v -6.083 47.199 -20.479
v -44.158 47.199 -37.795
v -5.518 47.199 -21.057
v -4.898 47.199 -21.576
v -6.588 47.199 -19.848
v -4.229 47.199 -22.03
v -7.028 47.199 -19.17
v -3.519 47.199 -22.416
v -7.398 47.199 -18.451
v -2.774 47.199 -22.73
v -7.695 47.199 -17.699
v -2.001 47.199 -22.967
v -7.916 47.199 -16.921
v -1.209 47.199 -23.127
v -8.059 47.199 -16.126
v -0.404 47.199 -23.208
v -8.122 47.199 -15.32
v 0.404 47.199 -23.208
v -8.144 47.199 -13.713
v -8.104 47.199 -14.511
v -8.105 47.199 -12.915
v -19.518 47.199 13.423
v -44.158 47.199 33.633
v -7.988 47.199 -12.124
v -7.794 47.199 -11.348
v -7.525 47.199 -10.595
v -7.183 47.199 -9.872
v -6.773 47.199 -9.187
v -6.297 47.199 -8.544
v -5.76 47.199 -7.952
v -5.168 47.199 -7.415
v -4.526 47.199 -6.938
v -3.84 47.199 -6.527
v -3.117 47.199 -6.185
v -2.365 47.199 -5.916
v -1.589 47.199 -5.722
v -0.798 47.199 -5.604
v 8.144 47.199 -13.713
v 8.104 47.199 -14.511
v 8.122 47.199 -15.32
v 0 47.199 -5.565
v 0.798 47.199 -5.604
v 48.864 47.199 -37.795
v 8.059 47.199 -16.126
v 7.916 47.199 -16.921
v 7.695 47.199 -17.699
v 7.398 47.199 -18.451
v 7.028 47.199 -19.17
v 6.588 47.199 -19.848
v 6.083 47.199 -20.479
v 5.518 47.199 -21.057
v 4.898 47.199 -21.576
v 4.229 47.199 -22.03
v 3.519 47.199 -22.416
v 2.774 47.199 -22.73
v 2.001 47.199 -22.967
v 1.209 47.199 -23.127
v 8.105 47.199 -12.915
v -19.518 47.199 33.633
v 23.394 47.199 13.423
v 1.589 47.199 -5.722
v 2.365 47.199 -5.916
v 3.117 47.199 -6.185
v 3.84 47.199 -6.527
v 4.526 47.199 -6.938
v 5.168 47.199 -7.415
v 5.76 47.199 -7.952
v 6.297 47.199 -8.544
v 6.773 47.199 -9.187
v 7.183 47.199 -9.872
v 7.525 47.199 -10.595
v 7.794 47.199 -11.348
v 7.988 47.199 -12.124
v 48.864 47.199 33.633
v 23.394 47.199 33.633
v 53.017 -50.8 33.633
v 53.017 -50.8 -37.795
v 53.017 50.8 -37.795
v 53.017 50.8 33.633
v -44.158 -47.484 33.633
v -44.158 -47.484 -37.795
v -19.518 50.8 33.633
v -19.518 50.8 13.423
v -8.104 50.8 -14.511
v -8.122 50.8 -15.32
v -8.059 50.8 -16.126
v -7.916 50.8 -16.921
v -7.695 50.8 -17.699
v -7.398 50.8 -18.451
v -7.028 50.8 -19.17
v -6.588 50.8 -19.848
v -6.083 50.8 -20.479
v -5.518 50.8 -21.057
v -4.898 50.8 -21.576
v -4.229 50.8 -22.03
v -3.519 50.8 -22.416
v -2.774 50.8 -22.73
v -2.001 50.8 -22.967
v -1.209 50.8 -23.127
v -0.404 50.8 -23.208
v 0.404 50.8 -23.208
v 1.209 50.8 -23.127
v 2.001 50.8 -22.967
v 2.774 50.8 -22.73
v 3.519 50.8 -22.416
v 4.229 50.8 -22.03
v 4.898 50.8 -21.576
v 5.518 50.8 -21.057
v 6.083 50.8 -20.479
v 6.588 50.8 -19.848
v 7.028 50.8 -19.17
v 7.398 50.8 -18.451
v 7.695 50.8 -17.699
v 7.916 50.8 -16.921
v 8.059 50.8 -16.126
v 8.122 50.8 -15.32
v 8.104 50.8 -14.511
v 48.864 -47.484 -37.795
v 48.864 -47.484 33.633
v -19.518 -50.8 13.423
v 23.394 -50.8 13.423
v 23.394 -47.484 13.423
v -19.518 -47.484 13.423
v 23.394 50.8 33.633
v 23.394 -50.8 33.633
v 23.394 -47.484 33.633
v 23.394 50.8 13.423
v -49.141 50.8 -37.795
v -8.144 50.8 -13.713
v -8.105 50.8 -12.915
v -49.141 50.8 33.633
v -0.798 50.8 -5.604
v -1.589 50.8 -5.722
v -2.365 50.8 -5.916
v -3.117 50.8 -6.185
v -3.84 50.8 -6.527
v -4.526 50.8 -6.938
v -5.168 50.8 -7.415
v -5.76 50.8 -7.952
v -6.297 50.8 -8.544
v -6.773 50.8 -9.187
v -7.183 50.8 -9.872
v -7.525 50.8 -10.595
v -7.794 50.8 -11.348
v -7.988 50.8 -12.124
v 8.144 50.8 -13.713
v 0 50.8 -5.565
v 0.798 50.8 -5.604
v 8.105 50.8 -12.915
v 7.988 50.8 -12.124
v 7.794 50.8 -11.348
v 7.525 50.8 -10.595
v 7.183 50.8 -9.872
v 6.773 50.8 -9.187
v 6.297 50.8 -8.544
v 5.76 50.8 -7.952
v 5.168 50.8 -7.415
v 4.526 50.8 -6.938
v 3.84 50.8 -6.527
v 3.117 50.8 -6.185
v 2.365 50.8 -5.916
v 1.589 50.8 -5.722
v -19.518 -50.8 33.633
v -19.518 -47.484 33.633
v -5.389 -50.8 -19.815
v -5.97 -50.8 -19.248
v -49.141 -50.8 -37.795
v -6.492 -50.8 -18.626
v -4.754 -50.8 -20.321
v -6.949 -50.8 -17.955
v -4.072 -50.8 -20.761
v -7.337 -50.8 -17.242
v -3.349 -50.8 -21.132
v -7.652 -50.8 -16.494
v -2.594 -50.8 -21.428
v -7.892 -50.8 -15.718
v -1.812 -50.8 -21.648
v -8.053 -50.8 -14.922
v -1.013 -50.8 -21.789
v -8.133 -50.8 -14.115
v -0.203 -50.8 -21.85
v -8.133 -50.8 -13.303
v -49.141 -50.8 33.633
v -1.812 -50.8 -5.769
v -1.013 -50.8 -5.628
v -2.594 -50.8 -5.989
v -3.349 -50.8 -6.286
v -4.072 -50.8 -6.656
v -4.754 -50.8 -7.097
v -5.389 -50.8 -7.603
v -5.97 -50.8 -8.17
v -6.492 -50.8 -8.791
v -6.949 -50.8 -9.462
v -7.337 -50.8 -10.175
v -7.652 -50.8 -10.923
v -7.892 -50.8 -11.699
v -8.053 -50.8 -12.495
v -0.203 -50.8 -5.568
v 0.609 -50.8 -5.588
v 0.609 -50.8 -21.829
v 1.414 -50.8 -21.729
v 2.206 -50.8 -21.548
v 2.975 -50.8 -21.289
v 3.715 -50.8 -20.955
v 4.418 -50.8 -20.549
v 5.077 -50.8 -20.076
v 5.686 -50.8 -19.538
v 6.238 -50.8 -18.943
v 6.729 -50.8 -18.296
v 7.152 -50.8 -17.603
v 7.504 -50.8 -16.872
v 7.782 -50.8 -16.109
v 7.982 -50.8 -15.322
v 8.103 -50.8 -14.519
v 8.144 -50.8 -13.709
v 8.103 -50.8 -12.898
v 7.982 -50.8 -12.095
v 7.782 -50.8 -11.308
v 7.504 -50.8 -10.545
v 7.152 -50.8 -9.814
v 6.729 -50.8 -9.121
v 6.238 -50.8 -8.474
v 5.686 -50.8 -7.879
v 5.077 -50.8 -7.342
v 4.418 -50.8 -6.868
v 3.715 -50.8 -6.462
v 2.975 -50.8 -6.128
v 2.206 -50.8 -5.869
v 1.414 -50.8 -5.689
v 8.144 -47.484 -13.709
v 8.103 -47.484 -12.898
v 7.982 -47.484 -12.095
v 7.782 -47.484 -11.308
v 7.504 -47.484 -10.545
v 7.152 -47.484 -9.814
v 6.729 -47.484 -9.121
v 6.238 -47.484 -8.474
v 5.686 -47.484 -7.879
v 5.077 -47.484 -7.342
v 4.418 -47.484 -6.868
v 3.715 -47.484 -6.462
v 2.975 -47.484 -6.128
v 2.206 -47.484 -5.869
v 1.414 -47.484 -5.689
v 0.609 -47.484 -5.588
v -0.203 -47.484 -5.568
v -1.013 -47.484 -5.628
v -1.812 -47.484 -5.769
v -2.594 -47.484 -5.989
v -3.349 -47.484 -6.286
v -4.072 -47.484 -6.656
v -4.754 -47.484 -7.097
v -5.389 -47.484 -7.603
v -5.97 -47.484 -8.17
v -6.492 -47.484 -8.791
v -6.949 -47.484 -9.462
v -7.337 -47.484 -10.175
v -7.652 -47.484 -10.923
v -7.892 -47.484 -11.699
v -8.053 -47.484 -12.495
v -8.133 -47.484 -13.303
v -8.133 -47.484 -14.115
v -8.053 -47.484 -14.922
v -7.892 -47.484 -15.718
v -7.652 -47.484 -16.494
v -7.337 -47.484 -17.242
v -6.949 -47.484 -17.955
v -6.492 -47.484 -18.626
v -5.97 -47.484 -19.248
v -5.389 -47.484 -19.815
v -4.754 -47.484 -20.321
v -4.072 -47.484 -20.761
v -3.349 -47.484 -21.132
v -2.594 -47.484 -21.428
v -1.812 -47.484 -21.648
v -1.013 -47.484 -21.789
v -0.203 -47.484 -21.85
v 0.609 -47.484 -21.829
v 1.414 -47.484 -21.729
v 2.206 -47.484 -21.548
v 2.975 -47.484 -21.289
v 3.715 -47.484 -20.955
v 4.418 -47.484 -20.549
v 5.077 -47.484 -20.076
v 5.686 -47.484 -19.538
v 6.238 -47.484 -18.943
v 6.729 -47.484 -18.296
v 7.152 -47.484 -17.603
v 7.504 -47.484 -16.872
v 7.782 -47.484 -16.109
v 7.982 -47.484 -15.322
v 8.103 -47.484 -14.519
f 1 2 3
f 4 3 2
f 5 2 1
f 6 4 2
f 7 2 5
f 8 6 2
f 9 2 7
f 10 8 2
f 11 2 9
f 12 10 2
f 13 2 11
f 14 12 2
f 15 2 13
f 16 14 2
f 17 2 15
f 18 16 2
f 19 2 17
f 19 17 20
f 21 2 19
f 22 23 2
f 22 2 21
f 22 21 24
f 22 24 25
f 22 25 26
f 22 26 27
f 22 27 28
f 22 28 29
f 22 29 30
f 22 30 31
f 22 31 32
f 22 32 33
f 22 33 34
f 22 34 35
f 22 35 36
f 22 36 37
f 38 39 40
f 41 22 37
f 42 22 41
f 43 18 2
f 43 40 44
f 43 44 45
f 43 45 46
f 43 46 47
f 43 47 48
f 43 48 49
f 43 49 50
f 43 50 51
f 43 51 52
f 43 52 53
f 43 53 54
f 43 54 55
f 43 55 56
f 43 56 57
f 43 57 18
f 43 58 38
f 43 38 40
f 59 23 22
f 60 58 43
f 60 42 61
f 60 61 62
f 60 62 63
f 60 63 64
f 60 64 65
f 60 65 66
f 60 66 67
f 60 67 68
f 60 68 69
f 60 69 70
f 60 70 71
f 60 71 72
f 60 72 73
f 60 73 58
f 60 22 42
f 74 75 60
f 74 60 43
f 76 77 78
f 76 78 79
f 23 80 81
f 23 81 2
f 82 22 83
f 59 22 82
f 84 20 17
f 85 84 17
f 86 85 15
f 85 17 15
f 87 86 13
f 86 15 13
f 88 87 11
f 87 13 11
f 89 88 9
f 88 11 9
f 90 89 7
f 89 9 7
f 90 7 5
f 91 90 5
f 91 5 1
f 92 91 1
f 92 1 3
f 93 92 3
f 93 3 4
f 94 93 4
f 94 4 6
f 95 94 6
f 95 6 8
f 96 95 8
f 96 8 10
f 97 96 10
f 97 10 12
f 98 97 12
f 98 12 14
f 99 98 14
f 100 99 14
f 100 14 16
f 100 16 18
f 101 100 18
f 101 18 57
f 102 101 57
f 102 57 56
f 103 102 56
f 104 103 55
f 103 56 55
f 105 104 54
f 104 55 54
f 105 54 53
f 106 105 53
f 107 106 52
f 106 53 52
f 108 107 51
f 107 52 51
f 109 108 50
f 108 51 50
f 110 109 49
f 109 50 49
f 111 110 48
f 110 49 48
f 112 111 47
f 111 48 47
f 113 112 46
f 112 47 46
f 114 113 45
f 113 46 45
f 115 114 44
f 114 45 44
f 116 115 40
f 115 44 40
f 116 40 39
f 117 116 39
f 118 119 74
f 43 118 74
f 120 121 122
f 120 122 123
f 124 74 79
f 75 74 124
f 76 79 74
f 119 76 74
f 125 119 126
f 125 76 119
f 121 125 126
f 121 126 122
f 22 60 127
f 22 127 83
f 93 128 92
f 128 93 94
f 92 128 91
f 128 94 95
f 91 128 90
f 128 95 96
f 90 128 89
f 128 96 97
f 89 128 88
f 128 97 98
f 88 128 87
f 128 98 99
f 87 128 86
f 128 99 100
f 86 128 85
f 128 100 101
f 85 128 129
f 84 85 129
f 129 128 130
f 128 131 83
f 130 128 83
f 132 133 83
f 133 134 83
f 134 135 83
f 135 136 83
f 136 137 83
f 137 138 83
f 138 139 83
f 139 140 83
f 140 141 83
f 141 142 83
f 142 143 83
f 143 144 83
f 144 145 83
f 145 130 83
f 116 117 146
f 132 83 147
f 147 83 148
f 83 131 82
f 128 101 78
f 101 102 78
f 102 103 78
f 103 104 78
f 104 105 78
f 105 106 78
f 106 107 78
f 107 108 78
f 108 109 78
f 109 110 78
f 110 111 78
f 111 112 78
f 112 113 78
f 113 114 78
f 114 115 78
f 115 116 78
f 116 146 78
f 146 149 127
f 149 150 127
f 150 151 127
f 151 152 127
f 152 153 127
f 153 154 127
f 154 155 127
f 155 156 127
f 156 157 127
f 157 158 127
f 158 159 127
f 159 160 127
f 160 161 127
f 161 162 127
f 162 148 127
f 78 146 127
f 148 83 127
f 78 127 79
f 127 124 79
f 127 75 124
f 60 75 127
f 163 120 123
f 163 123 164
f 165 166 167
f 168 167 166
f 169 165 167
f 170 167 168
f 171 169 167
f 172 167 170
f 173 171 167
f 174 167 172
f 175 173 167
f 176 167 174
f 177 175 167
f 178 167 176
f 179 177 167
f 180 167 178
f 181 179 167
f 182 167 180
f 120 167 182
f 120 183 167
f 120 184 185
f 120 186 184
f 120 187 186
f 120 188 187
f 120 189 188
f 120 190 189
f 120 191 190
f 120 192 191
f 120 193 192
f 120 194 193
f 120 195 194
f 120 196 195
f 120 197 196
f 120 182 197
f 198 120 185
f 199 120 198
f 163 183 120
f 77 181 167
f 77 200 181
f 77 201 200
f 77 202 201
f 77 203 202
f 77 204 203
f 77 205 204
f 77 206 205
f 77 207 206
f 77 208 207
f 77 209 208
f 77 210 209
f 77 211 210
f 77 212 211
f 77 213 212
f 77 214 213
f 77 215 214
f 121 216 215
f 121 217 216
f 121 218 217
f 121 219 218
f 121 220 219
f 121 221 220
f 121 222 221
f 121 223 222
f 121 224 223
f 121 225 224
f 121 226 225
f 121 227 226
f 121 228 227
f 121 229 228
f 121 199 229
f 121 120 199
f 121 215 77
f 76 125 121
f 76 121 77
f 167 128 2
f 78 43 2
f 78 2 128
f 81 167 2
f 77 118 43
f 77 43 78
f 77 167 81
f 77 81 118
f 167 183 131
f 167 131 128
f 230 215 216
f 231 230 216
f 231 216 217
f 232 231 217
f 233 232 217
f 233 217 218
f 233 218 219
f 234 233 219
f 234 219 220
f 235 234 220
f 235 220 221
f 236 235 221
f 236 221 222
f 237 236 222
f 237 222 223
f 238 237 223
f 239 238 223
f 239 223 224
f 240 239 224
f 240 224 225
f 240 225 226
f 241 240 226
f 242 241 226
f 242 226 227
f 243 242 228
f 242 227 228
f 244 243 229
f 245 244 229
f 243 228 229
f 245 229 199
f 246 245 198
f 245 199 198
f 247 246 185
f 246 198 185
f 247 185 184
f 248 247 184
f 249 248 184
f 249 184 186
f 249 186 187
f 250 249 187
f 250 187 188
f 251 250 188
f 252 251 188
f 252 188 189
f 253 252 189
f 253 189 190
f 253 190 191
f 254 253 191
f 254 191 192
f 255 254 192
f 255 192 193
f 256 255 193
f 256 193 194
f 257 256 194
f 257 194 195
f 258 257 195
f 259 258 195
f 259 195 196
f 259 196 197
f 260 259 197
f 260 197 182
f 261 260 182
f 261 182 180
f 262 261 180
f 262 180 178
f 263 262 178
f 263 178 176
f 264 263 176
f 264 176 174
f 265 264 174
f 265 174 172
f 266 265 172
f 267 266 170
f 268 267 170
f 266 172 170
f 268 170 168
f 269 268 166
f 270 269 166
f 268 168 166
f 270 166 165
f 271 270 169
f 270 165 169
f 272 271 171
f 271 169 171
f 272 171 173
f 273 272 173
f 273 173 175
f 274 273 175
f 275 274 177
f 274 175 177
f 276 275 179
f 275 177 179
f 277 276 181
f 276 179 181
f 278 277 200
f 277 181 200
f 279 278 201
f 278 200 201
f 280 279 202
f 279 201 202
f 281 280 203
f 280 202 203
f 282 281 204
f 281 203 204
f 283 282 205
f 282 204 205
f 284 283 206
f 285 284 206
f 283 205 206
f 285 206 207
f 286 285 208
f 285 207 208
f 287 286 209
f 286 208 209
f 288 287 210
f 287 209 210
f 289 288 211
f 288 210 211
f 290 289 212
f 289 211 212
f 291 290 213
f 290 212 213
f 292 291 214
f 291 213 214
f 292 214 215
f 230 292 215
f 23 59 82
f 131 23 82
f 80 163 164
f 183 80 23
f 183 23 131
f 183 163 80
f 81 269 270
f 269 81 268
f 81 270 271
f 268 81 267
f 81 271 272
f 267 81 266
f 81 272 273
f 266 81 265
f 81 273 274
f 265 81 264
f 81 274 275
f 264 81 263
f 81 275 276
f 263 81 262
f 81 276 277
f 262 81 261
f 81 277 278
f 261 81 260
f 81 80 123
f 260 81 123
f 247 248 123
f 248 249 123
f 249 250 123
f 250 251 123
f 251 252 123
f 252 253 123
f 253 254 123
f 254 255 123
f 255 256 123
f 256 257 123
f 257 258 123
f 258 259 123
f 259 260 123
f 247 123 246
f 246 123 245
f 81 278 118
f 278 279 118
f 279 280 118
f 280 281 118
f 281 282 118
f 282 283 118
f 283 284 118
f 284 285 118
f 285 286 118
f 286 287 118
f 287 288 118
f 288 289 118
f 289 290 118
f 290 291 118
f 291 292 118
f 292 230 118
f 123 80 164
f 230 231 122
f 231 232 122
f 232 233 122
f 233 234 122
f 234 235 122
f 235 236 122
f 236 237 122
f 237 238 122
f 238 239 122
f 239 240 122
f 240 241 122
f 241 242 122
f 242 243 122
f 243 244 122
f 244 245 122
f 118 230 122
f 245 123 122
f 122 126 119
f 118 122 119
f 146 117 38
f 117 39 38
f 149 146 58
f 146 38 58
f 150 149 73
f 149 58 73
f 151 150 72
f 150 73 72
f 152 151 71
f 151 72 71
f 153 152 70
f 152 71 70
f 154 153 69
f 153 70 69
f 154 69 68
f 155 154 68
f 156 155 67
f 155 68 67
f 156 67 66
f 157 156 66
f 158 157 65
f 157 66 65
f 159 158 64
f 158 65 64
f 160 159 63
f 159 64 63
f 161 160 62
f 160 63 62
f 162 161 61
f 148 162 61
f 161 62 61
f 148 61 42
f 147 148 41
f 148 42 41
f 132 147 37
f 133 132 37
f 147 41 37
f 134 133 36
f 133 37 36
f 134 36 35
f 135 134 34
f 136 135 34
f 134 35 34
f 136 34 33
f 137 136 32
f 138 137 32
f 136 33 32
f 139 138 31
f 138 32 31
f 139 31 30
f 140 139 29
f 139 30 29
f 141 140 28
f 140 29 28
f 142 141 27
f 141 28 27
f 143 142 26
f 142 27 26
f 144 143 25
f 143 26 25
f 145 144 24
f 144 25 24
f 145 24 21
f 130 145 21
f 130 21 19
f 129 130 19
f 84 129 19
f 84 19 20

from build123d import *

# Parameters (mm, degrees)
F1_DEPTH = 50.8
F2_W     = 93.022012
F2_H     = 94.683118
F3_DEPTH = 114.3
F4_R     = 8.12477
F5_DEPTH = 228.6
F6_R     = 8.143617
F7_DEPTH = 152.4


with BuildPart() as f1:
    # F0 (on Front) → F1 (new body, symmetric)
    with BuildSketch(Plane.XZ):
        Polygon((23.393929, 13.422799), (-19.51801, 13.422799), (-19.51801, 33.632938), (-49.14109, 33.632938), (-49.14109, 13.422799), (-49.14109, -37.794676), (53.017005, -37.794676), (53.017005, 13.422799), (53.017005, 33.632938), (23.393929, 33.632938), align=None)
    extrude(amount=F1_DEPTH, both=True)

    # F2 (on Top) → F3 (cut, symmetric)
    with BuildSketch(Plane.XY):
        with Locations((2.353236, -0.14291)):
            Rectangle(F2_W, F2_H)
    extrude(amount=F3_DEPTH, both=True, mode=Mode.SUBTRACT)

    # F4 (on Front) → F5 (cut)
    with BuildSketch(Plane.XZ):
        with Locations((0, -15.092876)):
            Circle(F4_R)
    extrude(amount=-F5_DEPTH, mode=Mode.SUBTRACT)

    # F6 (on face) → F7 (cut)
    with BuildSketch(Plane.XZ.offset(50.8)):
        with Locations((0, -13.708619)):
            Circle(F6_R)
    extrude(amount=-F7_DEPTH, mode=Mode.SUBTRACT)


solid = f1.part
